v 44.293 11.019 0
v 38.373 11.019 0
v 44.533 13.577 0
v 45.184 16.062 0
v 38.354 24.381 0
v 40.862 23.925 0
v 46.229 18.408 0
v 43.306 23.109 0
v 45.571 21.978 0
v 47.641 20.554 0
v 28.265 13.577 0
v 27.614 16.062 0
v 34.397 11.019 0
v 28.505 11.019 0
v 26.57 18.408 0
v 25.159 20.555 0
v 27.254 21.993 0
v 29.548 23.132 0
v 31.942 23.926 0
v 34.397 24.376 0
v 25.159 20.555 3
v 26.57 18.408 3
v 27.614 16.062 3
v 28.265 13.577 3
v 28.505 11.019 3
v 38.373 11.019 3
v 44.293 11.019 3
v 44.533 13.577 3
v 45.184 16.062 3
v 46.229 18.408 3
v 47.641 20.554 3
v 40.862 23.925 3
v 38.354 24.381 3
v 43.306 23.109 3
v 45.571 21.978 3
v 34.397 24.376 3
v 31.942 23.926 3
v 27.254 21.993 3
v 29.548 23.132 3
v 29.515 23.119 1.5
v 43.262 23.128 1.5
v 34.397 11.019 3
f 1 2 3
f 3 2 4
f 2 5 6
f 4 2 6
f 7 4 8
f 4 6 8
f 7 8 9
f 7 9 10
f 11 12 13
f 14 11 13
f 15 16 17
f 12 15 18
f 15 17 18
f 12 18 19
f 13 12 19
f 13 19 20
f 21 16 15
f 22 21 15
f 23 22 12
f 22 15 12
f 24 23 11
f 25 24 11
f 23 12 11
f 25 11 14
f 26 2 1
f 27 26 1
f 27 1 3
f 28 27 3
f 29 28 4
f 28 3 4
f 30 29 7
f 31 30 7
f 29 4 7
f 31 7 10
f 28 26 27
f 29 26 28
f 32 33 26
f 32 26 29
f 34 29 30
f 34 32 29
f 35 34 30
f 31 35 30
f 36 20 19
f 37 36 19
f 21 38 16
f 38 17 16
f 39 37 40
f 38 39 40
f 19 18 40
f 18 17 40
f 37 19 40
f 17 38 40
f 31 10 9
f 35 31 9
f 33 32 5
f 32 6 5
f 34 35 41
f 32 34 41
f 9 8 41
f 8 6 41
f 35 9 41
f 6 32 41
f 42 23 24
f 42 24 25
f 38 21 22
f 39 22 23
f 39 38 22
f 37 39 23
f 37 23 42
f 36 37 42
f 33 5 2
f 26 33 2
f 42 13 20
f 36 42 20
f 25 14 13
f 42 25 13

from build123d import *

# Parameters (mm, degrees)
SALIENTE_EXTRUIR1_DEPTH   = 3
SALIENTE_EXTRUIR1_2_DEPTH = 3


with BuildPart() as part:
    # Model → Saliente-Extruir1 (new body)
    with BuildSketch(Plane.XY):
        with BuildLine():
            Line((28.504746215, 11.01914405), (34.397149805, 11.01914405))
            Line((34.397149805, 11.01914405), (34.397149805, 24.375550539))
            add(Edge.make_bspline(
                [(34.397149805, 24.375550539), (29.241616022, 23.797846573), (25.15911927, 20.554975457)],
                knots=[3.251706493, 3.251706493, 3.251706493, 3.806338024, 3.806338024, 3.806338024], degree=2, weights=[1, 0.961769503, 0.999950817]))
            ThreePointArc((25.15911927, 20.554975457), (27.614337529, 16.061564872), (28.504746215, 11.01914405))
        make_face()
    extrude(amount=SALIENTE_EXTRUIR1_DEPTH)


with BuildPart() as body_2:
    # Model → Saliente-Extruir1 2 (new body)
    with BuildSketch(Plane.XY):
        with BuildLine():
            Line((38.372926733, 11.01914405), (44.29332666, 11.01914405))
            ThreePointArc((44.29332666, 11.01914405), (45.184353453, 16.061545628), (47.640831503, 20.554368572))
            add(Edge.make_bspline(
                [(47.640831503, 20.554368572), (43.537574655, 23.814087787), (38.35411017, 24.38085595)],
                knots=[2.476794104, 2.476794104, 2.476794104, 3.034124618, 3.034124618, 3.034124618], degree=2, weights=[0.999950091, 0.961398815, 1]))
            Line((38.35411017, 24.38085595), (38.372926733, 11.01914405))
        make_face()
    extrude(amount=SALIENTE_EXTRUIR1_2_DEPTH)


solid = Compound([part.part, body_2.part])
